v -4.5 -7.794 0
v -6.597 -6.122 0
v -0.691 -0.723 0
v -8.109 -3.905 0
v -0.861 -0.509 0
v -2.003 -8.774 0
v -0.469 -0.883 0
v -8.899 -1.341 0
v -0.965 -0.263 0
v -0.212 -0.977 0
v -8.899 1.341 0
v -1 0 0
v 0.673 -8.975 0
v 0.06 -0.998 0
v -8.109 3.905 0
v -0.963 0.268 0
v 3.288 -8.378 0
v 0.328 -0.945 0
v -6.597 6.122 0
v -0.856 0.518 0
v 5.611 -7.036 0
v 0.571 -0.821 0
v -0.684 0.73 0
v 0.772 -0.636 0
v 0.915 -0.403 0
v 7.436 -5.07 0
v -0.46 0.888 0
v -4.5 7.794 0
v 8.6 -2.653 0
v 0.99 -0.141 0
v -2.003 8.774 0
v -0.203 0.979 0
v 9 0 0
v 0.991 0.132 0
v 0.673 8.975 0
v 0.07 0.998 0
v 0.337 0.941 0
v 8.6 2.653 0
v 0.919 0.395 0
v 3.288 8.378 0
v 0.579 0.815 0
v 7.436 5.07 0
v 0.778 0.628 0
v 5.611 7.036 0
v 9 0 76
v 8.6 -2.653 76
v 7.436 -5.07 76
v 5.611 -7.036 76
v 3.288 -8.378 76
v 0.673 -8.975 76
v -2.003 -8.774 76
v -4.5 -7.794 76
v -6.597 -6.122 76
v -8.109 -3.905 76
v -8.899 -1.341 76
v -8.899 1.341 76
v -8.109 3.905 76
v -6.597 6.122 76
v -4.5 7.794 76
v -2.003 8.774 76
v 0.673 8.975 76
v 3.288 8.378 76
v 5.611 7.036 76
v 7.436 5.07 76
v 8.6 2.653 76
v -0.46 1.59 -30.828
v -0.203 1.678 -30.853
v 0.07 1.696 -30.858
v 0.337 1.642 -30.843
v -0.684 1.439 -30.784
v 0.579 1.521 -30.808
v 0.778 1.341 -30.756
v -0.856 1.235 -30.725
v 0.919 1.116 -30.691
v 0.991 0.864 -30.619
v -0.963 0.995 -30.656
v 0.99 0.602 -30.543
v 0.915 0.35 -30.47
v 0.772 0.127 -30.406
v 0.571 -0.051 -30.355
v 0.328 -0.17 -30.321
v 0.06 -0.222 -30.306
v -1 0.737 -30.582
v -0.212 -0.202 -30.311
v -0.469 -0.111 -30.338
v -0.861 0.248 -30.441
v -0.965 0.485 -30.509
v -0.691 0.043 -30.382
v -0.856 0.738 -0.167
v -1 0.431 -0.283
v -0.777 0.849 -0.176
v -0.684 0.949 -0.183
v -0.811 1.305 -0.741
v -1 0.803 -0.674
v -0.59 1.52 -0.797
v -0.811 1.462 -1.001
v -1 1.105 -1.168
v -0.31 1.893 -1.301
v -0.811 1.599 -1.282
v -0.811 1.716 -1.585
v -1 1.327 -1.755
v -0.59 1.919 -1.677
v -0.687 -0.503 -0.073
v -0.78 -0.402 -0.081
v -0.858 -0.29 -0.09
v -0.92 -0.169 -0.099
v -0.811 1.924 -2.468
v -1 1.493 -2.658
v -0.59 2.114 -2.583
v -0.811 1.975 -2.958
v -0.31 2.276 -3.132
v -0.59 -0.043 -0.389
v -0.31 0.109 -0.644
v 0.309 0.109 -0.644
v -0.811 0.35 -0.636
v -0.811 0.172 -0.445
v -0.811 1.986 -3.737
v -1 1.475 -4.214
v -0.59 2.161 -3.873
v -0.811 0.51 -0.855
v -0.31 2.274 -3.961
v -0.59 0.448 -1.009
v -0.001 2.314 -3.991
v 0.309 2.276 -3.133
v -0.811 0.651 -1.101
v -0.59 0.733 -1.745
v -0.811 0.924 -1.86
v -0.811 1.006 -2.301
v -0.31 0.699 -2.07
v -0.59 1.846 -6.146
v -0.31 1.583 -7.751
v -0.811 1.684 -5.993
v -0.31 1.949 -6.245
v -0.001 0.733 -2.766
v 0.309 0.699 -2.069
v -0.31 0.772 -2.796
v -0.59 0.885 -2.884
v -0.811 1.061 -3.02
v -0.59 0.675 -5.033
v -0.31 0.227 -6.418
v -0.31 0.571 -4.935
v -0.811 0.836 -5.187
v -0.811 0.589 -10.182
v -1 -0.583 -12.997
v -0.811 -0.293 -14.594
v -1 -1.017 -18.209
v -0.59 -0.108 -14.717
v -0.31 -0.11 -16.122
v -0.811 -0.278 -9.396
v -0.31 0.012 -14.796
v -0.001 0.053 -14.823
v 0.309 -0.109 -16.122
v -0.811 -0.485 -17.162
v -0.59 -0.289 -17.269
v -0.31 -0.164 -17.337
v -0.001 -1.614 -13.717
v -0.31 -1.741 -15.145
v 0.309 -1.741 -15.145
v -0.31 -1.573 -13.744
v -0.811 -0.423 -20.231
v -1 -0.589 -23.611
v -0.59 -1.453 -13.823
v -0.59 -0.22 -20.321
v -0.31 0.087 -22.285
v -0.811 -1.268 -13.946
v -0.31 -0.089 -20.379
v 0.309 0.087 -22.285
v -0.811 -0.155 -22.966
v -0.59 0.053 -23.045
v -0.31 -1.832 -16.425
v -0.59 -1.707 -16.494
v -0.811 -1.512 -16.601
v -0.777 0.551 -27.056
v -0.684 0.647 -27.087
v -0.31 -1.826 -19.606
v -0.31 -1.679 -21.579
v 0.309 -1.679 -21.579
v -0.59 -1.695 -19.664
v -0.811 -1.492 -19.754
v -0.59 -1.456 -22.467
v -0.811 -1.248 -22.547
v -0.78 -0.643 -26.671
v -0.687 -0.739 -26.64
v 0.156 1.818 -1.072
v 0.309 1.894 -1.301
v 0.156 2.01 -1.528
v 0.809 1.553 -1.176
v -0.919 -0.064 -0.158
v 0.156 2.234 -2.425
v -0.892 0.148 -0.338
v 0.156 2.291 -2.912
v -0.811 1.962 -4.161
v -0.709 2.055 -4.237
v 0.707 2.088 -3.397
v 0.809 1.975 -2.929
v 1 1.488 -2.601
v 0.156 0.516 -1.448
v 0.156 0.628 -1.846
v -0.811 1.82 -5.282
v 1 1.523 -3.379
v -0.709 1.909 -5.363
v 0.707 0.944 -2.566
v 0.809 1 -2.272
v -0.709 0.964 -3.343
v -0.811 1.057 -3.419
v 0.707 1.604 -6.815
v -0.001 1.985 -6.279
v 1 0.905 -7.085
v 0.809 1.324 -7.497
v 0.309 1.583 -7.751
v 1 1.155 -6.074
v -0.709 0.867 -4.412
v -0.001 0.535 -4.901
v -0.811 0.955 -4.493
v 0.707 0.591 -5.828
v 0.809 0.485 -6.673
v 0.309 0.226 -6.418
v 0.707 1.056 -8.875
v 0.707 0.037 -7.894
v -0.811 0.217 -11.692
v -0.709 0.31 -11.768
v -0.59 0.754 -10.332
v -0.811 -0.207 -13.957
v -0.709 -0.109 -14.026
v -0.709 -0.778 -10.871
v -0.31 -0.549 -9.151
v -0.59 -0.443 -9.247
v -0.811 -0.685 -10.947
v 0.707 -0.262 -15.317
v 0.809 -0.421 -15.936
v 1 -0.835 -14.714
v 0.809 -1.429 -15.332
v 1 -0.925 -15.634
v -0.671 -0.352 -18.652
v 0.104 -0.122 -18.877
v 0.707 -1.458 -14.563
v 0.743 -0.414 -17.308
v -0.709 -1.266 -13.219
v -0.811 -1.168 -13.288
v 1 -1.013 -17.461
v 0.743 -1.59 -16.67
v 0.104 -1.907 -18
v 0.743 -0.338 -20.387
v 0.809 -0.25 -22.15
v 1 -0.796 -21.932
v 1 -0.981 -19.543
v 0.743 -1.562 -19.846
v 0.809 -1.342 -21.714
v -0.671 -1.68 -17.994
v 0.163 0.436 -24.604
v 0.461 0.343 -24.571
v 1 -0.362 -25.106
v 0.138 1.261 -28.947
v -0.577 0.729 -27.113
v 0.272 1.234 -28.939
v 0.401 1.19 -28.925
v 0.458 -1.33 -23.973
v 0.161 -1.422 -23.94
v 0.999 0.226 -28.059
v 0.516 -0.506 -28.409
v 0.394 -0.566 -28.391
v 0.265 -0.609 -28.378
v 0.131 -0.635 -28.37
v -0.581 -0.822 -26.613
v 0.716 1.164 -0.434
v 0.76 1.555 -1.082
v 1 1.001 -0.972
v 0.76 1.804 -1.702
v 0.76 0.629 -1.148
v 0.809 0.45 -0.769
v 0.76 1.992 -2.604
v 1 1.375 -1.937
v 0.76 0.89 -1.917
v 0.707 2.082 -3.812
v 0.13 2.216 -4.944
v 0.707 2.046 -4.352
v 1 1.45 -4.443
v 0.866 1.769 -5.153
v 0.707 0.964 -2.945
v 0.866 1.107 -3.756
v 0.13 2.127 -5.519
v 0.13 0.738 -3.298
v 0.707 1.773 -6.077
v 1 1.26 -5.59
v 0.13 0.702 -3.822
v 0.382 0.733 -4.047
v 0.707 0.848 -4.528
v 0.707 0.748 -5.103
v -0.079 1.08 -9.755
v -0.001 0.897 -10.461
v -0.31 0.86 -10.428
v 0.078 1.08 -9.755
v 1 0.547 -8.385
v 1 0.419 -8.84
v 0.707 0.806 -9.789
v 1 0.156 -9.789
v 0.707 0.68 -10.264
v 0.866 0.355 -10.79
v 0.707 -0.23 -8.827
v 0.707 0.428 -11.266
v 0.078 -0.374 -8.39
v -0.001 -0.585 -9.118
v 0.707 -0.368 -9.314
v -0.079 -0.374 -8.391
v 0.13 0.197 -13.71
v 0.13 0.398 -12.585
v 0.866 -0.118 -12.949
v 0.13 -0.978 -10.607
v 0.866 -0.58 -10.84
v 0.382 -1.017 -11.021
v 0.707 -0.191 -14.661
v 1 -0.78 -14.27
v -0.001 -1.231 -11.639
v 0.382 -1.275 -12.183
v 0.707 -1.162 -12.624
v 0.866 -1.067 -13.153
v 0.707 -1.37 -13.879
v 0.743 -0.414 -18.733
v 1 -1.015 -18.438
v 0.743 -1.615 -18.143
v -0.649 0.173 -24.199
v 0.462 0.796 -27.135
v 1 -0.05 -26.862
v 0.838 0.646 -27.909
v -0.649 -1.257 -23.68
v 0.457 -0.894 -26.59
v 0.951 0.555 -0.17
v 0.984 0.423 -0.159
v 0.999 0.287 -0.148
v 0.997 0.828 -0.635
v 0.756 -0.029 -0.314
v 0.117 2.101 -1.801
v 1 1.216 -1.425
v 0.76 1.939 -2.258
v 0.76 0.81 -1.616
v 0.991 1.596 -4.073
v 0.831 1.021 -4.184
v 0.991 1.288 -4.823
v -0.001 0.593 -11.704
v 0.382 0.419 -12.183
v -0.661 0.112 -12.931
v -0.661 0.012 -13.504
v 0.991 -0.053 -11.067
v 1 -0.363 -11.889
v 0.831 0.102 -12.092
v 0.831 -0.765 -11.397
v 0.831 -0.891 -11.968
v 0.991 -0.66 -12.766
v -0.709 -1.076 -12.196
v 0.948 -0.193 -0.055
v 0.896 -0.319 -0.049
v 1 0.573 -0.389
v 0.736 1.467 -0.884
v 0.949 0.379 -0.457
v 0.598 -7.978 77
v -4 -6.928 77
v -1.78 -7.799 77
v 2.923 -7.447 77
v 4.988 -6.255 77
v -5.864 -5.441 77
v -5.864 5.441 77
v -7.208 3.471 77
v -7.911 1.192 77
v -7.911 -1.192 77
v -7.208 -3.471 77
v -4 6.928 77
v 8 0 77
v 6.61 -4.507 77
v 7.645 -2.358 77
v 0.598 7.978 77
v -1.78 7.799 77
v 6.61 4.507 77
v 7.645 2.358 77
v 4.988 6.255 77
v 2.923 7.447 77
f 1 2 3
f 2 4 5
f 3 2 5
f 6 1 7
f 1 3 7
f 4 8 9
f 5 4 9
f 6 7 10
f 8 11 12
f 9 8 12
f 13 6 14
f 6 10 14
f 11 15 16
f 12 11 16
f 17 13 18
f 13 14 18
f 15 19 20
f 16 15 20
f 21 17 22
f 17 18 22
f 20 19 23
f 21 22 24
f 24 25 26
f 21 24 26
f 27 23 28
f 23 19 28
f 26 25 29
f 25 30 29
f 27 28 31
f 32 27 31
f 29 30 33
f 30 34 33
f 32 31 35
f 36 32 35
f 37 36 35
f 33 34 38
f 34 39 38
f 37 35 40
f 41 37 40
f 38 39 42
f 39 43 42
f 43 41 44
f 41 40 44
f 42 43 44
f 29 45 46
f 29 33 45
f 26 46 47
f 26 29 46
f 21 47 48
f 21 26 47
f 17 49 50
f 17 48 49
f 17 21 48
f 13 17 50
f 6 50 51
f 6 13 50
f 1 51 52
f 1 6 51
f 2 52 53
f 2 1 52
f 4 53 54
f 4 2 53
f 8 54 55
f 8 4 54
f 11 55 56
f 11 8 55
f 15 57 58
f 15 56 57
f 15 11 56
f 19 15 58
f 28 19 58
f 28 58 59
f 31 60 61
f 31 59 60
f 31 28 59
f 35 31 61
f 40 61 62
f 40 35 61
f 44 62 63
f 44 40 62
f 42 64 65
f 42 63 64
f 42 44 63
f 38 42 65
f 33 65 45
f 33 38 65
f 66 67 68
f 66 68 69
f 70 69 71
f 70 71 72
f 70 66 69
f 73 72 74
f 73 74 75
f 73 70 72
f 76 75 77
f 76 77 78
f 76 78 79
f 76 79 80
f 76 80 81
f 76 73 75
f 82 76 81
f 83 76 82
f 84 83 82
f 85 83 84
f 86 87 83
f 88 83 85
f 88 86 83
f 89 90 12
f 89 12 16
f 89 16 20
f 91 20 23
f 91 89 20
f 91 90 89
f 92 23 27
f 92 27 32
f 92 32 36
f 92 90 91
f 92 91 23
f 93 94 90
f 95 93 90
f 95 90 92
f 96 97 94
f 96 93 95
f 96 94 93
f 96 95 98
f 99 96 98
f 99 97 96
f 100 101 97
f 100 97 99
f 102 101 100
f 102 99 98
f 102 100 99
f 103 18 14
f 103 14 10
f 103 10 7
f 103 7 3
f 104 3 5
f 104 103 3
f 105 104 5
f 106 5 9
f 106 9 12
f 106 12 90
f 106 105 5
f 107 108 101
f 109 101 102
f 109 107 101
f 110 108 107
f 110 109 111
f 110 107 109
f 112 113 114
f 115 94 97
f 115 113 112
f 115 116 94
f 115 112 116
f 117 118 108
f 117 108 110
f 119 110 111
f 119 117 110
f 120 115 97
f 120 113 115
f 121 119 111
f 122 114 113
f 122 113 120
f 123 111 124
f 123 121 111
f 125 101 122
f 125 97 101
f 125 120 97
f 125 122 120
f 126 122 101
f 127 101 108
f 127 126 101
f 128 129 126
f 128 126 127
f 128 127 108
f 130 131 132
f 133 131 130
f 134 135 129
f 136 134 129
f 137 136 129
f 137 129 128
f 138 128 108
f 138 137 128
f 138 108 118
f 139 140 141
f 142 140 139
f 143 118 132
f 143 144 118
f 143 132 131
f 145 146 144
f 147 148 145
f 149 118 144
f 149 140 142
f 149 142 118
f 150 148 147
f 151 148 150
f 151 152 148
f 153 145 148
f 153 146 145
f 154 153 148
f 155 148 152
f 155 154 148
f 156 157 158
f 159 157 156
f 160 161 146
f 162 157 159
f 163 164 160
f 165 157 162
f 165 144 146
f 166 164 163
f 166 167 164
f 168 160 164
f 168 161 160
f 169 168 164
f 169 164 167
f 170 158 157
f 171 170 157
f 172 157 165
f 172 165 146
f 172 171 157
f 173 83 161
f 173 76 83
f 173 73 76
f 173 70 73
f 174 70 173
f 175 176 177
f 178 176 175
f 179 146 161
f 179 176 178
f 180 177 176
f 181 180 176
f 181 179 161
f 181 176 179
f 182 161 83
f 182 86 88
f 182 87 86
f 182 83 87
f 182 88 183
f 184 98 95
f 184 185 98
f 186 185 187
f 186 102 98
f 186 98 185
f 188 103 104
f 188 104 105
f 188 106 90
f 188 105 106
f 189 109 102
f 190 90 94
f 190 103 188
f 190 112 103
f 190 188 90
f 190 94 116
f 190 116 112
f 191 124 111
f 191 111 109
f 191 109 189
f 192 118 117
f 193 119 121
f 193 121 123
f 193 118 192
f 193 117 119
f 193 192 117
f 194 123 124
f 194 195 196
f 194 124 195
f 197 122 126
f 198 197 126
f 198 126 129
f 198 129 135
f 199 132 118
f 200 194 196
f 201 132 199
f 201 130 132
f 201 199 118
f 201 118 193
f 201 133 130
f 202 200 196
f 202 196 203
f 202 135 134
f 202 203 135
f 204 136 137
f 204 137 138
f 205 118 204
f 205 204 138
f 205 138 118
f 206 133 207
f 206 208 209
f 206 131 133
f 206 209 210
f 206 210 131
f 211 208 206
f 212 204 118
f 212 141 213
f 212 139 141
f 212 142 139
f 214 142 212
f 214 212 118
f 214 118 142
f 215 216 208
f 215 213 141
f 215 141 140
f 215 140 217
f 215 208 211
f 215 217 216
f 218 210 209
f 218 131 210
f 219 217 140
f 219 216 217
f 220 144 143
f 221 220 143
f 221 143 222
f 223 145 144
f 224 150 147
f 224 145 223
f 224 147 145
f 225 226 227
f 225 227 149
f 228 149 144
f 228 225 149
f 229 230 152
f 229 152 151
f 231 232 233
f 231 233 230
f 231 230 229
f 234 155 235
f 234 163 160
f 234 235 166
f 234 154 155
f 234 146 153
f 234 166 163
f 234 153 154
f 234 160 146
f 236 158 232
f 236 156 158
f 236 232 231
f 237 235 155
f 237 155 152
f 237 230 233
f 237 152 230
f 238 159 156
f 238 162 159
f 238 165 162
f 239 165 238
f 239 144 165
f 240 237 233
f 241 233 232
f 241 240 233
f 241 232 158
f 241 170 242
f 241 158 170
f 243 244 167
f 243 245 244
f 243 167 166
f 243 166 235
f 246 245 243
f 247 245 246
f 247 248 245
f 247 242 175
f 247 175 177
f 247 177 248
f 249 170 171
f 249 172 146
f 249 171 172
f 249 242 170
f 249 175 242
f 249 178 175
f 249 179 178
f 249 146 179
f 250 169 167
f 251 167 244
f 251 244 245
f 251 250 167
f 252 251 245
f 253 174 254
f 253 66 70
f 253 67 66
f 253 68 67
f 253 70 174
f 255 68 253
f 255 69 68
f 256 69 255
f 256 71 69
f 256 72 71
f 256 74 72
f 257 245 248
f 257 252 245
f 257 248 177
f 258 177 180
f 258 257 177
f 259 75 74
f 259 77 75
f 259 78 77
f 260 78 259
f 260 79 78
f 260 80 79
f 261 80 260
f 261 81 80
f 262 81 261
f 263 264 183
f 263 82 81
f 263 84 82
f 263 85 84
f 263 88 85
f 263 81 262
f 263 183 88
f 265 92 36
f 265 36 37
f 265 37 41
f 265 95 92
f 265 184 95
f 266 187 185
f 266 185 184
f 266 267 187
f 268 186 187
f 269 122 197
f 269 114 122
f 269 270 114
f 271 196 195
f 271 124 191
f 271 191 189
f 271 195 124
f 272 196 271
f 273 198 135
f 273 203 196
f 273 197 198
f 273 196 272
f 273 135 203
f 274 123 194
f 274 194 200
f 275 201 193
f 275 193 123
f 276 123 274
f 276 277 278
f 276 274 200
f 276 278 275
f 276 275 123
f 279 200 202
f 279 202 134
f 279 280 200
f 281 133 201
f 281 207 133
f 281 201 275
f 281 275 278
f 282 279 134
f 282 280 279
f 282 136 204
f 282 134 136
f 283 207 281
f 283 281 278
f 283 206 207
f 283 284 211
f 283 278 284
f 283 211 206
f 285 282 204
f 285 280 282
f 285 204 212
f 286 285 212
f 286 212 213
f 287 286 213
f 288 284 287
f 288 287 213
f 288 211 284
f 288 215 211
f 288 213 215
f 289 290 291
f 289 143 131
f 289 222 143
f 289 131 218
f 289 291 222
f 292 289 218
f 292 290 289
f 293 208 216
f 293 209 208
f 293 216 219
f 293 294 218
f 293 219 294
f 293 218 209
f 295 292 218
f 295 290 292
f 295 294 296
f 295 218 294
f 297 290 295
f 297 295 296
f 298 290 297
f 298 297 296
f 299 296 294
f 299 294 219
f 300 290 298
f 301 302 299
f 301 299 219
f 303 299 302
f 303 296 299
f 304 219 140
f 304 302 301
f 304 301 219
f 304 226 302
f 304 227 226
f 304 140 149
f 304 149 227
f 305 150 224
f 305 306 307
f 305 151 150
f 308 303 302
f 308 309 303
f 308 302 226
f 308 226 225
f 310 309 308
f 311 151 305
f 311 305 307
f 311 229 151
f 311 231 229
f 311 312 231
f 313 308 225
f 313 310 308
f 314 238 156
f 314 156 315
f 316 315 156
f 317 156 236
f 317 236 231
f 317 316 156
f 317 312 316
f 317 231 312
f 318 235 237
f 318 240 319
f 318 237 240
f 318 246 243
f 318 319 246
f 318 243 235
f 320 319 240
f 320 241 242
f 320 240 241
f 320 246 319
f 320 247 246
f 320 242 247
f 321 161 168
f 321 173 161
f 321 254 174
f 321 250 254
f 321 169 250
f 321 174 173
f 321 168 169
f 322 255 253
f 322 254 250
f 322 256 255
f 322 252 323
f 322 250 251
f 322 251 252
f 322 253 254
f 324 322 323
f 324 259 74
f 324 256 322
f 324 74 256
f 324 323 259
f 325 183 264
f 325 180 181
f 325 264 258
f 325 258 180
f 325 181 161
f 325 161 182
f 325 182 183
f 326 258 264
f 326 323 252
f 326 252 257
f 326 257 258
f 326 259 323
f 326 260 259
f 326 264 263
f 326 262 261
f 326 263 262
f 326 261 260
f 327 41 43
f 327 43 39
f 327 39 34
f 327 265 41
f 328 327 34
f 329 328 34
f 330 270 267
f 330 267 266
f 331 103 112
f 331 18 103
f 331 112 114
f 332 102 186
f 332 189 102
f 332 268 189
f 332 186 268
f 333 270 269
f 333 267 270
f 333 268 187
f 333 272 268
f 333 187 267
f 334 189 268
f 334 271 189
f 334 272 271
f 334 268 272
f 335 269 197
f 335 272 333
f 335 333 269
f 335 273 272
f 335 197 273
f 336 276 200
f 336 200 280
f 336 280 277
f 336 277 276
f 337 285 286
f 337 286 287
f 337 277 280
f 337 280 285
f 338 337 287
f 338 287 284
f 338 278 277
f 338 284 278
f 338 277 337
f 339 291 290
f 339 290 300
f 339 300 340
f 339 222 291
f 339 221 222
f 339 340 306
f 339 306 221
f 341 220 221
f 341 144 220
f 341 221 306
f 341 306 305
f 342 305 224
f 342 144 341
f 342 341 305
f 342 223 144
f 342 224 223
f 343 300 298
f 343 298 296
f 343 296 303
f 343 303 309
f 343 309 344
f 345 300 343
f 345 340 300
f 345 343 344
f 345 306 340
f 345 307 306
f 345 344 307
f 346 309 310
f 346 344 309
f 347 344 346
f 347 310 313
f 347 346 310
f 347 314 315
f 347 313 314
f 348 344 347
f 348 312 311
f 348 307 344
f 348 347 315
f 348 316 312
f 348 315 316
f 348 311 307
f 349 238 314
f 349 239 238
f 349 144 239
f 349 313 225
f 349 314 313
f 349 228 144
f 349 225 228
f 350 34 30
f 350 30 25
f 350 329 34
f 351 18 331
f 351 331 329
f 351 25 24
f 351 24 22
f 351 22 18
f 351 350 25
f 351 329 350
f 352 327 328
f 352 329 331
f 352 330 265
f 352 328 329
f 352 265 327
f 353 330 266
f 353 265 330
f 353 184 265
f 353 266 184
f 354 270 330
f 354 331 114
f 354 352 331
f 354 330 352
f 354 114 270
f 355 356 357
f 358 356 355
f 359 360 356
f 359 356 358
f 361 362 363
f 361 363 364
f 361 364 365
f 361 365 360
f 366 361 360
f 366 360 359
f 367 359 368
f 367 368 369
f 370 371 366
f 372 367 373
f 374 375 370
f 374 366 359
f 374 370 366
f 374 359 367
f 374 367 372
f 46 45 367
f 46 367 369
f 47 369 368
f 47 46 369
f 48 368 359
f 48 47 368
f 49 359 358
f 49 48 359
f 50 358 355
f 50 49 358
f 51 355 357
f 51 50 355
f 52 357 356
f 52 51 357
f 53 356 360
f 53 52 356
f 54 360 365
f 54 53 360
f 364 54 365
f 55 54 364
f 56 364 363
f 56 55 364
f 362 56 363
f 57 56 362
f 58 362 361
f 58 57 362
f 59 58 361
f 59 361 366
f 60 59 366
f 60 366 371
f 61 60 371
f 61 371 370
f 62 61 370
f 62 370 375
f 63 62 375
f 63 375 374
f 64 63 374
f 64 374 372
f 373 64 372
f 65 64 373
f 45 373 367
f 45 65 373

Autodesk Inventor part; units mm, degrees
ref_plane "YZ Plane" through (0, 0, 0) normal (1, 0, 0) x (0, 1, 0)
ref_plane "XZ Plane" through (0, 0, 0) normal (0, 1, 0) x (-1, 0, 0)
ref_plane "XY Plane" through (0, 0, 0) normal (0, 0, 1) x (1, 0, 0)
sketch "Schizzo1" plane through (0, 0, 0) normal (0, 0, 1) x (1, 0, 0)
  circle A0 centre (0, 0) radius 9
  dimension "d0" = 18
extrude "Estrusione1" add sketch "Schizzo1" along normal blind 77
thread "Filettatura1"
chamfer "Smusso1" distance 1 angle 45 1 edges at (-9, 0, 77)
sketch "Schizzo3" plane through (0, 0, 0) normal (0, 0, -1) x (-1, 0, 0)
  circle A0 centre (0, 0) radius 1
  dimension "d8" = 2
sketch "Schizzo4" plane through (0, 0, 0) normal (1, 0, 0) x (0, 1, 0)
  line L0 (-9, 0) -> (9, 0) projected
  line L1 (3.6716, 0) -> (6.4362, -4.8477) construction
  line L2 (6.4362, -4.8477) -> (2.6524, -12.3111) construction
  line L3 (2.6524, -12.3111) -> (0, -13.9912) construction
  line L4 (0, -13.9912) -> (4.2654, -31.599) construction
  spline S0 degree 4 poles (3.6716, 0) (6.4362, -4.8477) (2.6524, -12.3111) (0, -13.9912) (4.2654, -31.599) knots 1 1 1 1 1 2 2 2 2 2
  point P0 (0, 0)
sweep "Sweep1" add profiles "Schizzo3" path "Schizzo4" path curves S0
properties part number "Modello sensore ultrasuoni" material "Plastica ABS"
